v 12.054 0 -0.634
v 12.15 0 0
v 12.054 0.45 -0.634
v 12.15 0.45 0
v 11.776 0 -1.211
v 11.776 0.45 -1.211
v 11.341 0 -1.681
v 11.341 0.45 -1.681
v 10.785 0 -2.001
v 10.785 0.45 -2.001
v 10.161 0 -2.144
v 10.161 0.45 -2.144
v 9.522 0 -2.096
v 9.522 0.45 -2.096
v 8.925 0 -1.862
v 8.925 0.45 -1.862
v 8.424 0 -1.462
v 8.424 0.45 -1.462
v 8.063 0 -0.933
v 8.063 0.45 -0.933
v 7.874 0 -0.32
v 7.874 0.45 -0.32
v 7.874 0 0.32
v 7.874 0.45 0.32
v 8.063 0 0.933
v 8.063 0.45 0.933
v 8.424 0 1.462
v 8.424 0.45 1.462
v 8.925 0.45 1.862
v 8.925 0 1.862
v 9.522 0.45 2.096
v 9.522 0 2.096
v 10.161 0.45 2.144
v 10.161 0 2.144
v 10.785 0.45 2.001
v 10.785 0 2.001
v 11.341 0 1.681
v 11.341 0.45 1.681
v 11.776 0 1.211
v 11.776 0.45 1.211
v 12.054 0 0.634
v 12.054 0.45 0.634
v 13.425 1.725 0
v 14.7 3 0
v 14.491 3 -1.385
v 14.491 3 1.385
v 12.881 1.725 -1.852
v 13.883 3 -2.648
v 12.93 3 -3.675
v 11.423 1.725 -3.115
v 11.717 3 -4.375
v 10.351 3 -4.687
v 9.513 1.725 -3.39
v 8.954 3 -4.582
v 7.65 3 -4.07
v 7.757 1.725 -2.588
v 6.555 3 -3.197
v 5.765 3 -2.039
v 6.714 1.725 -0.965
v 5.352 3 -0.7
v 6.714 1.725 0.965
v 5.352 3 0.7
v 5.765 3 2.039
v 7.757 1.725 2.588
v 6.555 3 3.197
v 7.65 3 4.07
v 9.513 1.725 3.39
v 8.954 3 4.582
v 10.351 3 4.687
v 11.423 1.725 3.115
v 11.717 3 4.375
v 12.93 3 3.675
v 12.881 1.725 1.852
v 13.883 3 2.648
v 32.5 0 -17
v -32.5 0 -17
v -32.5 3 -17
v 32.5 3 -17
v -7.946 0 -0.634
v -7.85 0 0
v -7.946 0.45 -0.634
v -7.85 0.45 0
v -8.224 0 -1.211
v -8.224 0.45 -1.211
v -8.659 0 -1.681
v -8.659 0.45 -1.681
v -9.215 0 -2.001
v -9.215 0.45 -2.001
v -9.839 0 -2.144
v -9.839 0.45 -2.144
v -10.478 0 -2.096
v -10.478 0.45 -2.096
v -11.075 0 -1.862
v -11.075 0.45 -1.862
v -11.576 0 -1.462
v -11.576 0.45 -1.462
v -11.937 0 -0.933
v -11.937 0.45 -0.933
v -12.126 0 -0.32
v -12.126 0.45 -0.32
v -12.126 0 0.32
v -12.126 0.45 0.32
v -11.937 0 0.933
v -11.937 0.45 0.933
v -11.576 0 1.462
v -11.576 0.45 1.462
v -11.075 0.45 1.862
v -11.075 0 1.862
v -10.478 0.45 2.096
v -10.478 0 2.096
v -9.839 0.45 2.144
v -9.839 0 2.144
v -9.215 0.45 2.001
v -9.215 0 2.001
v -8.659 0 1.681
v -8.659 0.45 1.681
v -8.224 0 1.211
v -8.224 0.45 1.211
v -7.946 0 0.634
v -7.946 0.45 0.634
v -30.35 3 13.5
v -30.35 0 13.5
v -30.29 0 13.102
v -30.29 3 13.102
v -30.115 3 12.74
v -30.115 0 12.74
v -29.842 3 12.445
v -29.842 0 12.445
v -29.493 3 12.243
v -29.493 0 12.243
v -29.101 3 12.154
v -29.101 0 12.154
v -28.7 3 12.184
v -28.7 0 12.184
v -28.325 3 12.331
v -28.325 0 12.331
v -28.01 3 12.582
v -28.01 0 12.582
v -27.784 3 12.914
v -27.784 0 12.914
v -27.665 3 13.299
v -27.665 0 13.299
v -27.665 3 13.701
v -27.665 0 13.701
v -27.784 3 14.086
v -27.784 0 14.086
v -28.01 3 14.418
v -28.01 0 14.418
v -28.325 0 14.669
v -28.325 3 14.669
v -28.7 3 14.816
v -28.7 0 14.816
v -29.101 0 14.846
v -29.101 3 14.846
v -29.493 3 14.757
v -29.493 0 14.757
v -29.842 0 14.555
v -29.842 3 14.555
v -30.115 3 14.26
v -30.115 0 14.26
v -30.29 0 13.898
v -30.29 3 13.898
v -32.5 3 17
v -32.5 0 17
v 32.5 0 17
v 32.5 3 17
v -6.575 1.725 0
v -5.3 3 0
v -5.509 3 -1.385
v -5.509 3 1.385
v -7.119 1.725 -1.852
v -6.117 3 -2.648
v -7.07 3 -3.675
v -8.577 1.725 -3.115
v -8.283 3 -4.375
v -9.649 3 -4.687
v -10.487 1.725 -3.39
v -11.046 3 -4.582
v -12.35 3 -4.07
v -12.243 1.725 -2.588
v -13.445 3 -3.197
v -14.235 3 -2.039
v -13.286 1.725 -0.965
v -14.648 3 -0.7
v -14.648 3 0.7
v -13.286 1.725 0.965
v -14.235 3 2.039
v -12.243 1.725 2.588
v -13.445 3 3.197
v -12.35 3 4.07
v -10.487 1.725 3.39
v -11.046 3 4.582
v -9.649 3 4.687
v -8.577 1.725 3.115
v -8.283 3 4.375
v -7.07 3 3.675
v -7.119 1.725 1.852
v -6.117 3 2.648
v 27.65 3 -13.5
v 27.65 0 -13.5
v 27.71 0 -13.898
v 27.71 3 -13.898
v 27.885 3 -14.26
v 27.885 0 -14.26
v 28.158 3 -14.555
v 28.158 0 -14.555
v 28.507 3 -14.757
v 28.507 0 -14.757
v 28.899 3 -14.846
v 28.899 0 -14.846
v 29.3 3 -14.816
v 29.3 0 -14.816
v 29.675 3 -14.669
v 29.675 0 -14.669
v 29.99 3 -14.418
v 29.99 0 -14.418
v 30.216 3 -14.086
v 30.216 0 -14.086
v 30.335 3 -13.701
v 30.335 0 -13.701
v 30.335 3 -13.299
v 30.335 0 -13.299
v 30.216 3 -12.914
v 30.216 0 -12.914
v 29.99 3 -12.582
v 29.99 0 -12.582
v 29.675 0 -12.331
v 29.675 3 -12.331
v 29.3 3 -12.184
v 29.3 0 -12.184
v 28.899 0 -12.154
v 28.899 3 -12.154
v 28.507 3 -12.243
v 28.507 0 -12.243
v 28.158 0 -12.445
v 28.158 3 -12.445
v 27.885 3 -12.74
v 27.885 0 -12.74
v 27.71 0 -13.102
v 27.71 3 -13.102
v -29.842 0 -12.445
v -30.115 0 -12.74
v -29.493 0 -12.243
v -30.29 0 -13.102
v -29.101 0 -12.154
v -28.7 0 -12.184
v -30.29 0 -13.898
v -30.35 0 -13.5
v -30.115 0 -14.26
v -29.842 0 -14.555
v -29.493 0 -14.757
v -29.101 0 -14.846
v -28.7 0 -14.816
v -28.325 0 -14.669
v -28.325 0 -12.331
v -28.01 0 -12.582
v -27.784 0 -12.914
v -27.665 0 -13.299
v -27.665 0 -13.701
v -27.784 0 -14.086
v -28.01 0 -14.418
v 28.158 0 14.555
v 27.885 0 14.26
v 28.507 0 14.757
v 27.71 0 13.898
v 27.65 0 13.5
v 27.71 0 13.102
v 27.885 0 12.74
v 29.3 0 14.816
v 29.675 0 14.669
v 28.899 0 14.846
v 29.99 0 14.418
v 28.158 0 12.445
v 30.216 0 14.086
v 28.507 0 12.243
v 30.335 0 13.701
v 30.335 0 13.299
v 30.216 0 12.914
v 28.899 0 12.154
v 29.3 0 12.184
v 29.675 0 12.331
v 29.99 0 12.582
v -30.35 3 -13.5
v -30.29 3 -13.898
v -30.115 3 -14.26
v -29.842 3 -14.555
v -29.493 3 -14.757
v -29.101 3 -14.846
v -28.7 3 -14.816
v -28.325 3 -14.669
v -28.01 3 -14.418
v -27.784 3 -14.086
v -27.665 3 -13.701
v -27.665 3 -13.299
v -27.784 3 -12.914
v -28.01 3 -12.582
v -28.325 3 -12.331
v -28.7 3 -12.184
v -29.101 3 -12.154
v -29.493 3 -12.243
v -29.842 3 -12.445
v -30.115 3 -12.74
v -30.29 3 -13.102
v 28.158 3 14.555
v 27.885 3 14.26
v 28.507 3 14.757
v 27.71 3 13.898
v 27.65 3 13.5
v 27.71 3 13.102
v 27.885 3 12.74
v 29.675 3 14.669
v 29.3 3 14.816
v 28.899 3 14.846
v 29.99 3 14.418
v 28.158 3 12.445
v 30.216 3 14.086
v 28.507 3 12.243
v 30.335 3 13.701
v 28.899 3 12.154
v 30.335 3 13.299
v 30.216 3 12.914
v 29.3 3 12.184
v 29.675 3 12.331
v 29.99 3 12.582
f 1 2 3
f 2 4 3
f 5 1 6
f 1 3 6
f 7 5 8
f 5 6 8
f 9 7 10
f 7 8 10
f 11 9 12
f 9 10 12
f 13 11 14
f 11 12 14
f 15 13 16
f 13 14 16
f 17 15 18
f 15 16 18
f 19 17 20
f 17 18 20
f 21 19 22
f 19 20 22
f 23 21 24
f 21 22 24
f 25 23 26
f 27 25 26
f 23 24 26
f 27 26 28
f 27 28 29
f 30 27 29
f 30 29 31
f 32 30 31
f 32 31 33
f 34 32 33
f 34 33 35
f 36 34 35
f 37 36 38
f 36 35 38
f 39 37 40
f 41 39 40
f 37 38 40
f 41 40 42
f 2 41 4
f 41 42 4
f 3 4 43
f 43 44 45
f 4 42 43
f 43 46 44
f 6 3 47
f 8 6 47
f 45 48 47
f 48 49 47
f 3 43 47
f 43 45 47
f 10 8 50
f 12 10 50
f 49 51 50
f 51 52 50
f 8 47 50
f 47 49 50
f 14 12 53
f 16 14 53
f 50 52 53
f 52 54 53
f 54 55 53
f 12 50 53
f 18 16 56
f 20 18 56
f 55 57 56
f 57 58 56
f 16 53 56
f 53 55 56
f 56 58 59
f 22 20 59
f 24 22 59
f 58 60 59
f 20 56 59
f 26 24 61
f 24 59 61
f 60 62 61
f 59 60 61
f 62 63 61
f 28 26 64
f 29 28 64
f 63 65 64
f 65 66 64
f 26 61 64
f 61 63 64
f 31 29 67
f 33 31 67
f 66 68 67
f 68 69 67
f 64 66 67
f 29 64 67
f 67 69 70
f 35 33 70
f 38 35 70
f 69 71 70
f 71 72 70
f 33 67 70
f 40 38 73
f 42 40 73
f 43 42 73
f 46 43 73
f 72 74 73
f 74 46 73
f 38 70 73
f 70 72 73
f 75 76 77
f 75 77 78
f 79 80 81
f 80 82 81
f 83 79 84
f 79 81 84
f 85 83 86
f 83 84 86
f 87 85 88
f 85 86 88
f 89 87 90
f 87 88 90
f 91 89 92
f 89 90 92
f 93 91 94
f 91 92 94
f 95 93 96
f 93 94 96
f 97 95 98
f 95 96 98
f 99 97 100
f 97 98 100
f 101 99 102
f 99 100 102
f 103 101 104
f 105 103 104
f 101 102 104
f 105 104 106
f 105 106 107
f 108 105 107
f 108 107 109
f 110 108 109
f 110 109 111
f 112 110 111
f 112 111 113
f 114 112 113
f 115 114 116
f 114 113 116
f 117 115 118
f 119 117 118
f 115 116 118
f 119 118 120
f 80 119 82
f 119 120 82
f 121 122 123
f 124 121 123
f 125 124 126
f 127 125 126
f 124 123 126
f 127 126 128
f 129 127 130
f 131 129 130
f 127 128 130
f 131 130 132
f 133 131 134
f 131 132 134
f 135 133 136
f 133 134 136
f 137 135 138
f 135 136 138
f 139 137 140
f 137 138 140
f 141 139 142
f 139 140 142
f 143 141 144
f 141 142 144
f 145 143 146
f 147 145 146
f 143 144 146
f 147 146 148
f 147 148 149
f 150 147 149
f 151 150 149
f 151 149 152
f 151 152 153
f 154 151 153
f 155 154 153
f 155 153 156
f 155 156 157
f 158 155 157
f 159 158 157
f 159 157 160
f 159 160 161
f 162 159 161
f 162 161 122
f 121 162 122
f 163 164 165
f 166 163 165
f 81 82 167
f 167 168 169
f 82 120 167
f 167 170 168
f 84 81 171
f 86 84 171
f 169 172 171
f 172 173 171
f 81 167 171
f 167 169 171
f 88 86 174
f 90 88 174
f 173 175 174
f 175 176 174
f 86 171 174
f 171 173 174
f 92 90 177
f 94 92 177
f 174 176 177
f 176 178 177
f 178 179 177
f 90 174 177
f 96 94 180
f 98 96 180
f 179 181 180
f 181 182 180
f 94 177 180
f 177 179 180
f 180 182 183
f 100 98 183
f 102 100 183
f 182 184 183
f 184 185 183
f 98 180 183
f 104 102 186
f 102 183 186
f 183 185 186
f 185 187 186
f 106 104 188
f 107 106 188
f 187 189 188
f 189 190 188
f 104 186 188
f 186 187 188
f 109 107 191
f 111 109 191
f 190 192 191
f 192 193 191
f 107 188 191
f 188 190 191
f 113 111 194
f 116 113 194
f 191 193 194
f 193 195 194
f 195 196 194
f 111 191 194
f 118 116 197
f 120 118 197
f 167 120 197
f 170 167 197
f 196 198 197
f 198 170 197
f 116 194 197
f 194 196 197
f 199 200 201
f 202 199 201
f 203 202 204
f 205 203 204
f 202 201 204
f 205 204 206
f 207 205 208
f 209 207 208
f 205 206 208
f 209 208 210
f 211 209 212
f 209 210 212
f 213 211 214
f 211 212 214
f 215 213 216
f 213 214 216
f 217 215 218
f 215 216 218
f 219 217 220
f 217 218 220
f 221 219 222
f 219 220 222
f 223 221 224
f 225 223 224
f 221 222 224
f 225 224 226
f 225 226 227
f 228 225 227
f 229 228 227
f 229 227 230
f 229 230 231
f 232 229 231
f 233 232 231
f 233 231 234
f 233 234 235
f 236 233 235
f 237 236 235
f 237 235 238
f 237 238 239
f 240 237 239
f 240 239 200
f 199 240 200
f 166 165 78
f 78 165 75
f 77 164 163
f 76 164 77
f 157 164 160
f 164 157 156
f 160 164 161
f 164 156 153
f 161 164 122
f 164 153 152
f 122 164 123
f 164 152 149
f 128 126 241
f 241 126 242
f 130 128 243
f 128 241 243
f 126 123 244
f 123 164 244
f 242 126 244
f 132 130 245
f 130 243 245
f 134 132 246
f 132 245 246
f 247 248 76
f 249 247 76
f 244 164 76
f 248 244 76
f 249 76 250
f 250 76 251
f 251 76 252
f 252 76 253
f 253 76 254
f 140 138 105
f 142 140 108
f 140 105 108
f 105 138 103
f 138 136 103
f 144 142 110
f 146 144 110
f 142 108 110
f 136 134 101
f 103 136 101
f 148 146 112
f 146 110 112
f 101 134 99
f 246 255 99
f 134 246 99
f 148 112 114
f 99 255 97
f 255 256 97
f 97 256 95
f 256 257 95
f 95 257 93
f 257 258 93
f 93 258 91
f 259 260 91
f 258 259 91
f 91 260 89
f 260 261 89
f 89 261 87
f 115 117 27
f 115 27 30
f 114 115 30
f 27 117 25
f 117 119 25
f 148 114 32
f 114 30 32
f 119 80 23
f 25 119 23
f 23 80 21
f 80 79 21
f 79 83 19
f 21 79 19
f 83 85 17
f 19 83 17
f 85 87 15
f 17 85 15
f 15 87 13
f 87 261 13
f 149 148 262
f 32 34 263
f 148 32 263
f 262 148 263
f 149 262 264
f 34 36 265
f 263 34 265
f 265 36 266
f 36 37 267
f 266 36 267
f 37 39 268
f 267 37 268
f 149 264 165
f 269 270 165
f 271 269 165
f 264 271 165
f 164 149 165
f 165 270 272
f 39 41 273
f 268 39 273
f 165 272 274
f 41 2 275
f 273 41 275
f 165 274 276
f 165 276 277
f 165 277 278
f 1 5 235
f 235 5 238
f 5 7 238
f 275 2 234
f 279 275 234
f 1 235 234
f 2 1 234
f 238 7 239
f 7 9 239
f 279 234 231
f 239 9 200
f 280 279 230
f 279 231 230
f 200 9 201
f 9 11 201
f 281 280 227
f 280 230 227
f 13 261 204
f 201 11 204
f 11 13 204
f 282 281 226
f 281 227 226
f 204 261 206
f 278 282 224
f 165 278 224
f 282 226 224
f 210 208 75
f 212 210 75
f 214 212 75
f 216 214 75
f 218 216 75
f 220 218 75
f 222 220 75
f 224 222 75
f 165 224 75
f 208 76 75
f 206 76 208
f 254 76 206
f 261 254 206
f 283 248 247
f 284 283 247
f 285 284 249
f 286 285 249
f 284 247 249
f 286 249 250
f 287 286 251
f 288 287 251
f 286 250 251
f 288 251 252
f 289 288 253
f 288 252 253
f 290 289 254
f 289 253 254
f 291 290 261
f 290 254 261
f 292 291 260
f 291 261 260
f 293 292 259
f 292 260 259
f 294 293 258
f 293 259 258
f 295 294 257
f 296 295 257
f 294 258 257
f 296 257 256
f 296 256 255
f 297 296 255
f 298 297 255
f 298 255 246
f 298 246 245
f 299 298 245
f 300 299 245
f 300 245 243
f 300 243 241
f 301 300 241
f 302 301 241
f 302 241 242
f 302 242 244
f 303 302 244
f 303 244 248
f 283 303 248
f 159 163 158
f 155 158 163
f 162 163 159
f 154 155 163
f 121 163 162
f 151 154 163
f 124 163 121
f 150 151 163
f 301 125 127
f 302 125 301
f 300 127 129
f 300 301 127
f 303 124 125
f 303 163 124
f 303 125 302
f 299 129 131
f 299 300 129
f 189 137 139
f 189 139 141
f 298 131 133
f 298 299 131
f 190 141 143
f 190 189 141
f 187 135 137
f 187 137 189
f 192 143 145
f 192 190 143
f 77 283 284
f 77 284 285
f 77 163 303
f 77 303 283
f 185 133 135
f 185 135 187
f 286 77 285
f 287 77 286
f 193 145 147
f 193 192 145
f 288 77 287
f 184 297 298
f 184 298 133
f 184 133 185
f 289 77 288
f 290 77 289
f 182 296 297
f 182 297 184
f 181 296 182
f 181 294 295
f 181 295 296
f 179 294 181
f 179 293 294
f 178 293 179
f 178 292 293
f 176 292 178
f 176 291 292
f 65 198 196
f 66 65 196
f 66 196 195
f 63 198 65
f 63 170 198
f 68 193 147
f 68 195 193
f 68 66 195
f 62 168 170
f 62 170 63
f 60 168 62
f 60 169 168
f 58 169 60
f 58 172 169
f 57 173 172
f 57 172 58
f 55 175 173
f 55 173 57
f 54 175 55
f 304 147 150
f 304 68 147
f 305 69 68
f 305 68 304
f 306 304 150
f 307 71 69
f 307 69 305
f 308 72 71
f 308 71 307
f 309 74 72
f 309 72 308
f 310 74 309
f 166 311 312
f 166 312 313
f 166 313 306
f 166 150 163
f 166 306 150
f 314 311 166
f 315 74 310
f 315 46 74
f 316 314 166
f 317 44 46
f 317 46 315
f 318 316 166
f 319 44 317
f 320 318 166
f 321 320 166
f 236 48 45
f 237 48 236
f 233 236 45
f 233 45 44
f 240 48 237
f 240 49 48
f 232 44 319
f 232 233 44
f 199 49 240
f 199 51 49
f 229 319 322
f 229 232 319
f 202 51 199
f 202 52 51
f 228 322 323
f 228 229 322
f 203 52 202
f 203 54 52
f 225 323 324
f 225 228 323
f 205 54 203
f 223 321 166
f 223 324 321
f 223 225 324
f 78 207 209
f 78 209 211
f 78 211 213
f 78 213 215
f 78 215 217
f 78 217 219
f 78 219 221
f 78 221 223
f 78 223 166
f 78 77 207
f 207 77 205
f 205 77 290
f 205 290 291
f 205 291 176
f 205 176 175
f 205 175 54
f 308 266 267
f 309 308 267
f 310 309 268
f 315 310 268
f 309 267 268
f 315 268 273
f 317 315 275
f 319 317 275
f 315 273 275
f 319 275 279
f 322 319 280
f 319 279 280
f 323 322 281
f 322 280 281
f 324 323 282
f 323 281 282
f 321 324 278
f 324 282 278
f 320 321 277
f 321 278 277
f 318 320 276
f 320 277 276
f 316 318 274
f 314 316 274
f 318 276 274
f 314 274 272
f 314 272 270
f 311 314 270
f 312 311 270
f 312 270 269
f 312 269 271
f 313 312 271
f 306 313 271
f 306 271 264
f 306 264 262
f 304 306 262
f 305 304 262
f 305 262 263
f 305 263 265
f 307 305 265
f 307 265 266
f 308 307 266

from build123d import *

# Parameters (mm, degrees)
SKETCH1_W              = 65
SKETCH1_H              = 34
SKETCH1_R              = 0.5
BOSS_EXTRUDE1_DEPTH    = 3
M2_5_CLEARANCE_HOLE1_D = 2.7


# Read off the part's stored shape, not the designer's step: CSK for M4 Flat Head Machine Screw1
with BuildPart() as part:
    # Sketch1 → Boss-Extrude1 (new body)
    with BuildSketch(Plane(origin=(0, 0, 0), x_dir=(1, 0, 0), z_dir=(0, 1, 0))):
        Rectangle(SKETCH1_W, SKETCH1_H)
        with Locations(Location((-29, -13.5, 0), (0, 0, 270))):
            Circle(SKETCH1_R, mode=Mode.SUBTRACT)
        with Locations(Location((-29, 13.5, 0), (0, 0, 270))):
            Circle(SKETCH1_R, mode=Mode.SUBTRACT)
        with Locations(Location((29, -13.5, 0), (0, 0, 270))):
            Circle(SKETCH1_R, mode=Mode.SUBTRACT)
        with Locations(Location((29, 13.5, 0), (0, 0, 270))):
            Circle(SKETCH1_R, mode=Mode.SUBTRACT)
        with Locations(Location((-10, 0, 0), (0, 0, 270))):
            Circle(SKETCH1_R, mode=Mode.SUBTRACT)
        with Locations(Location((10, 0, 0), (0, 0, 270))):
            Circle(SKETCH1_R, mode=Mode.SUBTRACT)
    extrude(amount=BOSS_EXTRUDE1_DEPTH)

    # M2.5 Clearance Hole1 (through all)
    with Locations(Plane(origin=(0, 3, 0), x_dir=(1, 0, 0), z_dir=(0, 1, 0))):
        with Locations((-29, -13.5), (-29, 13.5), (29, 13.5), (29, -13.5)):
            Hole(M2_5_CLEARANCE_HOLE1_D / 2)

    # CSK for M4 Flat Head Machine Screw1 outl → CSK for M4 Flat Head Machine Screw1 (revolve, cut)
    with BuildSketch(Plane(origin=(10, 0, 0), x_dir=(1, 0, 0), z_dir=(0, 0, 1))):
        Polygon((0.5, 0), (2.15, 0), (2.15, 0.45), (4.7, 3), (0.5, 3), align=None)
    revolve(axis=Axis((10, 0, 0), (0, 1, 0)), mode=Mode.SUBTRACT)

    # CSK for M4 Flat Head Machine Screw1 2 ou → CSK for M4 Flat Head Machine Screw1 2 (revolve, cut)
    with BuildSketch(Plane(origin=(-10, 0, 0), x_dir=(1, 0, 0), z_dir=(0, 0, 1))):
        Polygon((0.5, 0), (2.15, 0), (2.15, 0.45), (4.7, 3), (0.5, 3), align=None)
    revolve(axis=Axis((-10, 0, 0), (0, 1, 0)), mode=Mode.SUBTRACT)


solid = part.part
